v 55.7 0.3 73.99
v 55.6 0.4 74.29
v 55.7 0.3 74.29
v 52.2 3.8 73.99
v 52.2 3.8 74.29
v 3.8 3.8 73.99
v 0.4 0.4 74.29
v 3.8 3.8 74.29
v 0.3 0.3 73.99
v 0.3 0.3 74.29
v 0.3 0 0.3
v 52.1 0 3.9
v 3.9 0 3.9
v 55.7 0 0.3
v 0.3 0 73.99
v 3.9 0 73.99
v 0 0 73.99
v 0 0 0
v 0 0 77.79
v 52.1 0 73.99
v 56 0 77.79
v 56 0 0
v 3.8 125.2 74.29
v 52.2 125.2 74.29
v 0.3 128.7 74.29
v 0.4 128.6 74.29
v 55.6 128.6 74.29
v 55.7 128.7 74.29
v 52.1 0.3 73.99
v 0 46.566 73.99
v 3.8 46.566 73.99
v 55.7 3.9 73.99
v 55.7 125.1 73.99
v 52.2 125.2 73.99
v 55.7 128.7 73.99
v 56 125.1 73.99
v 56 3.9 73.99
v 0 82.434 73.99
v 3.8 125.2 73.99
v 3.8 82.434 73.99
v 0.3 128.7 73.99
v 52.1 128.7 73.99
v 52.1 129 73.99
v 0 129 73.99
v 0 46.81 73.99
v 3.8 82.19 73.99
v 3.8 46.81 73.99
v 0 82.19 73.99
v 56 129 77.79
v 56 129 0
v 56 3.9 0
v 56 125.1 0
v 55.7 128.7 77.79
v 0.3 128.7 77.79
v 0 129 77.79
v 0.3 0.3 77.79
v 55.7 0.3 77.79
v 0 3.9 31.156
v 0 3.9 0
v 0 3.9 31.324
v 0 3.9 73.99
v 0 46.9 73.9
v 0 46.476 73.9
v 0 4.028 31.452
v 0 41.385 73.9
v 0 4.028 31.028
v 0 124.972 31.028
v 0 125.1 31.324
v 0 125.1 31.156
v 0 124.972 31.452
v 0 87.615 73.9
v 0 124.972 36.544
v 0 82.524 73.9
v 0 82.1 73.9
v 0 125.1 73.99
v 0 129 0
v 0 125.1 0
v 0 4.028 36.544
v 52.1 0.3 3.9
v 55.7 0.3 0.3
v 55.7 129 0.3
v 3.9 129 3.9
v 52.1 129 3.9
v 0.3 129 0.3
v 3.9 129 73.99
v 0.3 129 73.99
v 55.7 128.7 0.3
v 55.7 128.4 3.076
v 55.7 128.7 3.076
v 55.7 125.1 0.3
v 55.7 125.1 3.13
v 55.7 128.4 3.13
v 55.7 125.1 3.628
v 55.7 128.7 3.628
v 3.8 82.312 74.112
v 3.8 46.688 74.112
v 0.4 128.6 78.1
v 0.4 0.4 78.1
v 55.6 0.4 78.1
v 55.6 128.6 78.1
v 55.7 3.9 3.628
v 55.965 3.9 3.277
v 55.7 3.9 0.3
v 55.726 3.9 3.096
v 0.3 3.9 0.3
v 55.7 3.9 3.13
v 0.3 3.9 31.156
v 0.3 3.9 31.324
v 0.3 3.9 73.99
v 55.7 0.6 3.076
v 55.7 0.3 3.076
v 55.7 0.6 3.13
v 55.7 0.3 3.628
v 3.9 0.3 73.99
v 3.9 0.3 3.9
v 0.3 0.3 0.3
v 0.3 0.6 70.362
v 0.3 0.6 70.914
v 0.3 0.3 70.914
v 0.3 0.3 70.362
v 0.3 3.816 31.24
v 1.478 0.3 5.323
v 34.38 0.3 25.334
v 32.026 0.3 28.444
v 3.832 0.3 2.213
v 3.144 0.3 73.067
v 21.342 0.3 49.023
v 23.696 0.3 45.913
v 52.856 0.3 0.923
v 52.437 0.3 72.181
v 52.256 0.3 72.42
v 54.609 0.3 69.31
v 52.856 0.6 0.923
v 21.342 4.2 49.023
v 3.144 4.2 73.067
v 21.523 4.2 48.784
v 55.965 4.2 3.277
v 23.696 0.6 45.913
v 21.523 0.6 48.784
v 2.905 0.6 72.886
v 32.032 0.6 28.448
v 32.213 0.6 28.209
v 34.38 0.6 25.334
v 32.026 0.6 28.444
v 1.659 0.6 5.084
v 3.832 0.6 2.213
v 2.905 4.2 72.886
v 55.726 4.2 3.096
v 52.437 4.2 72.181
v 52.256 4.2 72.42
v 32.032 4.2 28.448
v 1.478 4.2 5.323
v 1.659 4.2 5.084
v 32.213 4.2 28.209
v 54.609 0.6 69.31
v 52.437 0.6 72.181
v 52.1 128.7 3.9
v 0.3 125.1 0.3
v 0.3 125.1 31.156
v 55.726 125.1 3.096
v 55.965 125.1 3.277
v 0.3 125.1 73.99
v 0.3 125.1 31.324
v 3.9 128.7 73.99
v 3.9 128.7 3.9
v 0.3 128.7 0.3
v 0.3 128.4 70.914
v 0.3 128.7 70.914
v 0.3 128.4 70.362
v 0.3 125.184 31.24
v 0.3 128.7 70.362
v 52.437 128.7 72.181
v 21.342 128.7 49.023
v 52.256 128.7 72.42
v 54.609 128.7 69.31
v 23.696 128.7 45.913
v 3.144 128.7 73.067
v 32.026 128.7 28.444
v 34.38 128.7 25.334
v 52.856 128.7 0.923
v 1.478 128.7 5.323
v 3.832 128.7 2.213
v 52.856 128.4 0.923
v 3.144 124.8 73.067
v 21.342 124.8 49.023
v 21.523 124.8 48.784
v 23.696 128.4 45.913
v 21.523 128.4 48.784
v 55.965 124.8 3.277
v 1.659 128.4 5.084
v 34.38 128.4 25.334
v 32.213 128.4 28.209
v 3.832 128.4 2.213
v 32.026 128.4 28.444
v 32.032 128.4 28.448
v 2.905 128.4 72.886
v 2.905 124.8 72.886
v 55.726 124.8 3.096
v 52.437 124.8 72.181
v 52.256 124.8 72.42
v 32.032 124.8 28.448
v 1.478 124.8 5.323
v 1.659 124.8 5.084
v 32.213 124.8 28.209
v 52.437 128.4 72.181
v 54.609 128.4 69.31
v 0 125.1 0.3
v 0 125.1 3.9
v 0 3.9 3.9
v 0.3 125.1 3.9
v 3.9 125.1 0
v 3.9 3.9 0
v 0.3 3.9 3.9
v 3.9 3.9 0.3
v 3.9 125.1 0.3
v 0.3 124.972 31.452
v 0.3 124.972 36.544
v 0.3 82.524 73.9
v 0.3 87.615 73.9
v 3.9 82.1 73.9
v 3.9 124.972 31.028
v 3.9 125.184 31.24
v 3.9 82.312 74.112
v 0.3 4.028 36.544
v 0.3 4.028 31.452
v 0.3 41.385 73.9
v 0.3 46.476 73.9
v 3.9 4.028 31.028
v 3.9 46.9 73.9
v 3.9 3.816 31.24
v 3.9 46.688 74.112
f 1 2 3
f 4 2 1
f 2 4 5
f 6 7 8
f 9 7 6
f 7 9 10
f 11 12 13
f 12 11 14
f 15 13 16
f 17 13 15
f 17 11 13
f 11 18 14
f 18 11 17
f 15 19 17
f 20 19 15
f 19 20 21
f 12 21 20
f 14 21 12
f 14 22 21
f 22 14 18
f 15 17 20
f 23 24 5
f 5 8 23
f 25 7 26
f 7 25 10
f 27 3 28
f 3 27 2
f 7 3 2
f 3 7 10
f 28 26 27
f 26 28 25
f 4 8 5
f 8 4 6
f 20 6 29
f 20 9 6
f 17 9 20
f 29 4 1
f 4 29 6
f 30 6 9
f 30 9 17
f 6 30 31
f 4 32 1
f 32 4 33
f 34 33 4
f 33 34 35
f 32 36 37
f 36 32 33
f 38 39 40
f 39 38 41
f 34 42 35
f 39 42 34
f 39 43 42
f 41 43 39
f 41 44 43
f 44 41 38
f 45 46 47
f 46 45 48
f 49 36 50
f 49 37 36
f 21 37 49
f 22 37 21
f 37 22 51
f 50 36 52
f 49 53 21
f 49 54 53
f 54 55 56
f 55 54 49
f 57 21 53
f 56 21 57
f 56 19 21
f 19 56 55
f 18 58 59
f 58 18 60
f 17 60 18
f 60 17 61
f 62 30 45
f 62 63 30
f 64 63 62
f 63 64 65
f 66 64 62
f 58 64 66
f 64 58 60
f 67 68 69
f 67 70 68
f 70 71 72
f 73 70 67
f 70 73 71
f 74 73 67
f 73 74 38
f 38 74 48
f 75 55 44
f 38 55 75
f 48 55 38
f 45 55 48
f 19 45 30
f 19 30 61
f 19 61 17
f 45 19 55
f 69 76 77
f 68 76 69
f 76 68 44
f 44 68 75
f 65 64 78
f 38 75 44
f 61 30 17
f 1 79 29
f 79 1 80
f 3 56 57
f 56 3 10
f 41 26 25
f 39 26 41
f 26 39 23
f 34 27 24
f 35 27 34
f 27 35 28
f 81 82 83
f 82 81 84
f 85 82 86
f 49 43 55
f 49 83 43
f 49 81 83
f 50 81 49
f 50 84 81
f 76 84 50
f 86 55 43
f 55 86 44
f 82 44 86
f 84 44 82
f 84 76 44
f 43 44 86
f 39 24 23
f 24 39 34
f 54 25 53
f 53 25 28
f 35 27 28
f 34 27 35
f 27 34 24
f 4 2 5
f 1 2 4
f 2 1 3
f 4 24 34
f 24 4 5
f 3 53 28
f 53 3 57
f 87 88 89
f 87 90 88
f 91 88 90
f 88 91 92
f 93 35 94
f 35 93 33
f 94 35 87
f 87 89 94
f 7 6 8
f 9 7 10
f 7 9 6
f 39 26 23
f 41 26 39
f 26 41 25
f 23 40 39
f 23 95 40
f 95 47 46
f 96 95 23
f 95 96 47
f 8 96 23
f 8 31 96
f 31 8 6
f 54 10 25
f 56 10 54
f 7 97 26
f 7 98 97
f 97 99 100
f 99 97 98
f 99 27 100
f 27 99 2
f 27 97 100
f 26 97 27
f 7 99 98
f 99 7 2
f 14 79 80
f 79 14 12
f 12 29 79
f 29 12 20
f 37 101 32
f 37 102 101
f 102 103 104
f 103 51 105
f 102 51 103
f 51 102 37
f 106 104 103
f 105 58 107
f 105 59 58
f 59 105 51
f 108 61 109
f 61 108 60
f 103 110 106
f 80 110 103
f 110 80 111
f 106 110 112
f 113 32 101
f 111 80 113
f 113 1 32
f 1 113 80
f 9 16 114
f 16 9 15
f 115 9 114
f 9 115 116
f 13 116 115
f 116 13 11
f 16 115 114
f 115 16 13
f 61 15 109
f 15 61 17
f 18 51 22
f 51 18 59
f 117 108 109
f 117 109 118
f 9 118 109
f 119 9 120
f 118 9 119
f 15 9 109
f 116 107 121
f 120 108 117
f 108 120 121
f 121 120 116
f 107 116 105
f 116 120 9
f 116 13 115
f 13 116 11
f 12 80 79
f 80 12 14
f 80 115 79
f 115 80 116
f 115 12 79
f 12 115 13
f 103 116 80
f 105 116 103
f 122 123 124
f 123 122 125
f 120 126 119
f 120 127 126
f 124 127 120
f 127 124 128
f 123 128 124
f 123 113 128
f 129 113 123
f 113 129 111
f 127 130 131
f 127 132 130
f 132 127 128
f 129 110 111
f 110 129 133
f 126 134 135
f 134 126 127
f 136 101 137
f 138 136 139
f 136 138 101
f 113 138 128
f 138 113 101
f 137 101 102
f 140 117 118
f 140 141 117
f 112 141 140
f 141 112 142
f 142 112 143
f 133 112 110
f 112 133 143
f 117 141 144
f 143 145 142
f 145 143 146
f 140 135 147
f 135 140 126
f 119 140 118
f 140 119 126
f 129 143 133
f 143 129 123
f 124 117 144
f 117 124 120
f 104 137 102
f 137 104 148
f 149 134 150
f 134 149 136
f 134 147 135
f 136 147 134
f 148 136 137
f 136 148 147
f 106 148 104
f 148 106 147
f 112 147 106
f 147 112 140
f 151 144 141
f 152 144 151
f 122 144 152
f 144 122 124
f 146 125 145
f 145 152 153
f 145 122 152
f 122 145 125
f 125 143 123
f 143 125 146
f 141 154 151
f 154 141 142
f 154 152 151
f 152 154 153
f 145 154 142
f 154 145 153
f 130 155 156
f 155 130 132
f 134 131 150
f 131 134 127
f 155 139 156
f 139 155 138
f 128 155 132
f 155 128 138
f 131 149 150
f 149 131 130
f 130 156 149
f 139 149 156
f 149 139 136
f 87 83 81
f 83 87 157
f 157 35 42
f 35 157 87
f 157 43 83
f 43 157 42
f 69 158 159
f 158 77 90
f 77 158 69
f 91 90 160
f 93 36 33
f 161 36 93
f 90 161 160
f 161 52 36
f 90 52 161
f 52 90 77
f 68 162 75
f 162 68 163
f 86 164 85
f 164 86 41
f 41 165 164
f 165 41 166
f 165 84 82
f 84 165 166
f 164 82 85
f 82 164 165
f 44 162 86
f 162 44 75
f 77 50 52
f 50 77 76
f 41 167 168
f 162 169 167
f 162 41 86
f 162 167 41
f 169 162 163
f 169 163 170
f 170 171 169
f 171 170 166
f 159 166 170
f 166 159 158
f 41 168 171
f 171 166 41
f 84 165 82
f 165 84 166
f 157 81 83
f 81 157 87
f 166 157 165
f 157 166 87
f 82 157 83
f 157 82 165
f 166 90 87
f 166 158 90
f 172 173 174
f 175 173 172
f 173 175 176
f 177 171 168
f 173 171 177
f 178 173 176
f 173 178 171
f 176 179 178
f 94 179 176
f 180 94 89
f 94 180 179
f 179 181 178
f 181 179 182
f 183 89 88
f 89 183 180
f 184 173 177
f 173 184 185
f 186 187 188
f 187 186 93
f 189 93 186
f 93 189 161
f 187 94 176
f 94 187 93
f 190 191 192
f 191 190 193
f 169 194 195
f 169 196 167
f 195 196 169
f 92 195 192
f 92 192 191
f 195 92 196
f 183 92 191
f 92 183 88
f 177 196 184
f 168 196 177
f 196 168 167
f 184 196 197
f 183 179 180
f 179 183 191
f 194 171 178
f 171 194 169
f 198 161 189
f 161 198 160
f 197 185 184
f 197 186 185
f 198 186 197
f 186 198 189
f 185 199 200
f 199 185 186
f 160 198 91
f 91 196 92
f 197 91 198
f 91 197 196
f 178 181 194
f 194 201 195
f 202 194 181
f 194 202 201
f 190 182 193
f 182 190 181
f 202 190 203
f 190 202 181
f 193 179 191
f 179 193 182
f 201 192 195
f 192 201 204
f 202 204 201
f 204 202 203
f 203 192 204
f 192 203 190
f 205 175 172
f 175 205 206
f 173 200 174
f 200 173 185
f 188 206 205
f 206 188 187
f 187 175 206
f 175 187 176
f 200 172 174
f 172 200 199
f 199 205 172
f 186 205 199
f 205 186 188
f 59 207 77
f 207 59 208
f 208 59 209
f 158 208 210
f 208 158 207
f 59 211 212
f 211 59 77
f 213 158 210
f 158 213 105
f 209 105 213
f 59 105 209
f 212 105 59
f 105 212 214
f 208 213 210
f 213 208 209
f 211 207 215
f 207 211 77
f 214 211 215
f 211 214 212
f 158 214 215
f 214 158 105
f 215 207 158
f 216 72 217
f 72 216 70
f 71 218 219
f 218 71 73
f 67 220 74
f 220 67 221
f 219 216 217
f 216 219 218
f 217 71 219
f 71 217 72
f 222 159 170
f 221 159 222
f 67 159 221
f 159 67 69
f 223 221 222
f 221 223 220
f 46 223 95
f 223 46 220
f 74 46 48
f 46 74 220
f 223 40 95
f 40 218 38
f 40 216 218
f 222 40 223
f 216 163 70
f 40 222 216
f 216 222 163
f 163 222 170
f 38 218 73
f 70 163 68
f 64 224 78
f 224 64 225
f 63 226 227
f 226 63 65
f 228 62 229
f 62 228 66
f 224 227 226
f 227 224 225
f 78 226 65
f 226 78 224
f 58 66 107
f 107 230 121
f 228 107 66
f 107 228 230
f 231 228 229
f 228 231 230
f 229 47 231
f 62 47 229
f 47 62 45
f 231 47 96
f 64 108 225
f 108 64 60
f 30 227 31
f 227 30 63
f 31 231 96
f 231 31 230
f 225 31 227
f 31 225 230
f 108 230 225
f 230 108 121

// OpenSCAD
// file: ../hdim.scad
module hdim(x1 = 10, x2 = 20, y = 10, dimline_lenght = 9.0) 
{
    dimline_overlap = 0.5;
    dimline_width = 0.3;
    text_size = 2;
    tmp = 2*dimline_overlap+text_size/2;
    text_pos = dimline_lenght>0 ? tmp : -tmp; 
    dimline_abs = dimline_lenght>0 ? dimline_lenght : -dimline_lenght;
    
    color([0,0,0])
    {
        translate([x1,y-dimline_lenght/2,0]) 
            square([dimline_width, 
                dimline_abs + 2*dimline_overlap], 
                center=true, $fs=0.01);
                
        translate([x2,y-dimline_lenght/2,0]) 
            square([dimline_width, 
                dimline_abs + 2*dimline_overlap], 
                center=true, $fs=0.01);

        translate([(x1+x2)/2,y-dimline_lenght,0]) 
            square([x2-x1, 
                dimline_width], 
                center=true, $fs=0.01);
    }
        
    translate([(x1+x2)/2,y-dimline_lenght-text_pos,0]) 
    {
        color([0,0,0])
        cube([text_size * 5, 1.2*text_size, 0.9], center=true);
        
        color([0.8,0.8,0.5,1.0])
        {
            translate([0,0,0.2])
            text(str(0.1*round((x2-x1)*10)), size = text_size, 
                halign = "center",valign = "center");
            translate([0,0,-0.2])
            rotate([0,180,0])
            text(str(0.1*round((x2-x1)*10)), size = text_size, 
                halign = "center",valign = "center");
        }
    }
}

hdim();
// file: tableleg.scad
// use <hdim.scad> 


bar_t  = 0.3;

module tableleg(height = 73.9, width = 56, bar_diam = 3.8, dimensions=true, explode=false)
{
    d = explode ? 20 : 0;
    c1 = [0.5,0.28,0.19, 1.0];
    c2 = [0.8,0.30,0.29, 1.0];
    
    translate([width,0,0])
    rotate([0,90,90])
    {
    translate([-height,-d,0]) 
    tl_anglebar(height, bar_diam, c1, straight1=true);
    translate([0,width+d,0]) 
    rotate([0,0,180])
    tl_anglebar(height, bar_diam, c1, straight2=true);
    translate([d,0,0]) 
    rotate([0,0,90])
    tl_anglebar(width, bar_diam, c2);
    angle = atan2(width, height);
    len = sqrt(width*width+height*height) - (bar_diam+bar_t)/cos(angle);
    translate([-height/2,width/2,bar_t]) 
    rotate([0,0,-angle])
    translate([-len/2,-bar_diam/2,0]) 
    tl_anglebar(len, bar_diam, c2, straight1=true, straight2=true);

    
    hyp = width - 1.41*bar_diam;
    angle2 = -angle+90;
    cat1 = sin(angle)*hyp;
    cat2 = cos(angle)*hyp;
    len2 = cat2 - bar_diam/2;
    
    dx = cat1*cos(angle);
    dy = cat1*sin(angle)+1.25*bar_diam/2;
    translate([-dx,dy,bar_t]) 
    rotate([0,0, angle2])
    translate([len2,4*bar_diam/3,0]) 
    rotate([0,0,180])
    tl_anglebar(len2, bar_diam, c2, straight1=true, straight2=true);

    dx2 = height-dx-bar_diam/2-bar_t;
    dy2 = width-dy-bar_diam/2+bar_t;
    translate([-dx2,dy2,bar_t]) 
    rotate([0,0, angle2])
    translate([0,bar_diam/2,0]) 
     rotate([0,0,180])
    tl_anglebar(len2+0.5,bar_diam, c2,straight1=true, straight2=true);
    }
}        

module tl_anglebar(height, bar_diam, c, straight1=false, straight2=false)
{
   color(c)
    {
        linear_extrude(bar_t) 
        polygon(points=[[0,0],
            [straight1?0:bar_diam, bar_diam],
            [straight2?height:height-bar_diam, bar_diam],
            [height, 0], [0,0]]);
 
        cube([height, bar_t, bar_diam]);
    }
}   


tableleg();
// file: ../simpleplaywood.scad
module simpleplaywood(length=57, width = 210, spacing = 0.5, playwood_thickness = 0.75 * 2.54) 
{
    translate([length/2+spacing,width/2+spacing,-playwood_thickness/2])
    color([0.80,0.43,0.32])
    cube([length-2*spacing, width-2*spacing, playwood_thickness],center=true);
    
 
}

simpleplaywood();
// file: ../anglebarframe.scad
use <hdim.scad> 

bar_diam = 3.8;
bar_t  = 0.3;

module anglebarframe(length = 60, width = 210, explode=false)
{
    d = explode ? 20 : 0;
    c1 = [0.5,0.28,0.19, 1.0];
    c2 = [0.8,0.30,0.29, 1.0];
    
    rotate([0,180,0])
    {
    translate([-length,-d,0]) 
    anglebar(length, c1);
    translate([0,width+d,0]) 
    rotate([0,0,180])
    anglebar(length, c1);
    translate([d,0,0]) 
    rotate([0,0,90])
    anglebar(width, c2);
    translate([-length-d,width,0]) 
    rotate([0,0,-90])
    anglebar(width,c2);
    }
}        

module anglebar(length, c)
{
   color(c)
    {
        linear_extrude(bar_t) 
        polygon(points=[[0,0],
            [bar_diam, bar_diam],
            [length-bar_diam, bar_diam],
            [length, 0], [0,0]]);
 
        cube([length, bar_t, bar_diam]);
    }
}   


anglebarframe();
// main file
use <../anglebarframe.scad>
use <../simpleplaywood.scad>
use <tableleg.scad>

playwood_thickness = 2 * 0.75 * 2.54;
bar_diam = 3.9;

module worktable(width = 129, depth = 56, height = 77.8, explode=false)
{
    anglebar_thickness = 0.3;
    playwood_allowance = 0.1 + anglebar_thickness; // Needs to include 0.3 mm for angle bar
 
    translate([depth,0,height-playwood_thickness])
    rotate([0,180,0])
    {
    anglebarframe(depth, width, explode);
    
    translate([-playwood_allowance,-playwood_allowance,-anglebar_thickness])
    simpleplaywood(depth, width, playwood_allowance, playwood_thickness);
    }
    
    text_size = 4;
    row_step = 7;
    ystart = width - row_step;
    
    color([0.9,0.9,0.1,1.0])
    {
        t1 = "WORK TABLE"; 
        t2 = str(width, "cm x ", depth, "cm");
     
        translate([depth/2,ystart,height]) 
        {
            text(t1, size = text_size, 
                halign = "center",valign = "top");
            translate([0, -8, 0]) 
                text(t2, size = text_size, 
                    halign = "center",valign = "top");
        }
    } 
    
    tableleg(height-playwood_thickness, depth, bar_diam, true, explode);
    
    translate([0, width, 0])
    mirror([0,1,0])
    tableleg(height-playwood_thickness, depth, bar_diam, false, explode);
    
    c = [0.7,0.30,0.39, 1.0];
    translate([0, bar_diam, 0])
    rotate([90,0,90])
    tl_anglebar(width-2*bar_diam, bar_diam, c, straight1=true, straight2=true);

    d = width/3;
    l = 1.41 * d;
    translate([0, width-d-bar_diam, height-bar_diam])
    rotate([90,45,90])
    tl_anglebar(l, bar_diam, c);
    
    translate([0, d+bar_diam, height-bar_diam])
    mirror([0,1,0])
    rotate([90,45,90])
    tl_anglebar(l, bar_diam, c);
}        

worktable();
